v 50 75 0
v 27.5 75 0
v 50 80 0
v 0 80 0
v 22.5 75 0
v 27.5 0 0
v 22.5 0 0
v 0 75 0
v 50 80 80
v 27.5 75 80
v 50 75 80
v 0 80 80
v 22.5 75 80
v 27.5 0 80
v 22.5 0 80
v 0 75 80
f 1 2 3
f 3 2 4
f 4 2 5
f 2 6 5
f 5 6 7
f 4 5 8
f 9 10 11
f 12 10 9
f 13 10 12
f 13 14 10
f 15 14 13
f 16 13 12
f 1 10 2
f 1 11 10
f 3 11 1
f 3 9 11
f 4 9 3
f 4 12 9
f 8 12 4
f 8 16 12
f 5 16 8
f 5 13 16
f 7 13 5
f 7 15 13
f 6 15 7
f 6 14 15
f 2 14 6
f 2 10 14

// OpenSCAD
$fn = 32;

// ----------------------------------------------------------------------
// Structural section: tee 50 x 80 mm
// ----------------------------------------------------------------------

// --- parameters (mm) ---
sec_w = 50;               // tee width, X
sec_h = 80;               // tee height, Y
flange_t = 5;             // top flange thickness
web_t = 5;                // web thickness
plate_t = 80;             // cut length, Z (extrusion height)

profile = [[22.5, 0], [27.5, 0], [27.5, 75], [50, 75], [50, 80], [0, 80], [0, 75], [22.5, 75]];  // primary outline, 8 points, counter clockwise

// --- the one profile operation ---
linear_extrude(height = plate_t) polygon(points = profile);
